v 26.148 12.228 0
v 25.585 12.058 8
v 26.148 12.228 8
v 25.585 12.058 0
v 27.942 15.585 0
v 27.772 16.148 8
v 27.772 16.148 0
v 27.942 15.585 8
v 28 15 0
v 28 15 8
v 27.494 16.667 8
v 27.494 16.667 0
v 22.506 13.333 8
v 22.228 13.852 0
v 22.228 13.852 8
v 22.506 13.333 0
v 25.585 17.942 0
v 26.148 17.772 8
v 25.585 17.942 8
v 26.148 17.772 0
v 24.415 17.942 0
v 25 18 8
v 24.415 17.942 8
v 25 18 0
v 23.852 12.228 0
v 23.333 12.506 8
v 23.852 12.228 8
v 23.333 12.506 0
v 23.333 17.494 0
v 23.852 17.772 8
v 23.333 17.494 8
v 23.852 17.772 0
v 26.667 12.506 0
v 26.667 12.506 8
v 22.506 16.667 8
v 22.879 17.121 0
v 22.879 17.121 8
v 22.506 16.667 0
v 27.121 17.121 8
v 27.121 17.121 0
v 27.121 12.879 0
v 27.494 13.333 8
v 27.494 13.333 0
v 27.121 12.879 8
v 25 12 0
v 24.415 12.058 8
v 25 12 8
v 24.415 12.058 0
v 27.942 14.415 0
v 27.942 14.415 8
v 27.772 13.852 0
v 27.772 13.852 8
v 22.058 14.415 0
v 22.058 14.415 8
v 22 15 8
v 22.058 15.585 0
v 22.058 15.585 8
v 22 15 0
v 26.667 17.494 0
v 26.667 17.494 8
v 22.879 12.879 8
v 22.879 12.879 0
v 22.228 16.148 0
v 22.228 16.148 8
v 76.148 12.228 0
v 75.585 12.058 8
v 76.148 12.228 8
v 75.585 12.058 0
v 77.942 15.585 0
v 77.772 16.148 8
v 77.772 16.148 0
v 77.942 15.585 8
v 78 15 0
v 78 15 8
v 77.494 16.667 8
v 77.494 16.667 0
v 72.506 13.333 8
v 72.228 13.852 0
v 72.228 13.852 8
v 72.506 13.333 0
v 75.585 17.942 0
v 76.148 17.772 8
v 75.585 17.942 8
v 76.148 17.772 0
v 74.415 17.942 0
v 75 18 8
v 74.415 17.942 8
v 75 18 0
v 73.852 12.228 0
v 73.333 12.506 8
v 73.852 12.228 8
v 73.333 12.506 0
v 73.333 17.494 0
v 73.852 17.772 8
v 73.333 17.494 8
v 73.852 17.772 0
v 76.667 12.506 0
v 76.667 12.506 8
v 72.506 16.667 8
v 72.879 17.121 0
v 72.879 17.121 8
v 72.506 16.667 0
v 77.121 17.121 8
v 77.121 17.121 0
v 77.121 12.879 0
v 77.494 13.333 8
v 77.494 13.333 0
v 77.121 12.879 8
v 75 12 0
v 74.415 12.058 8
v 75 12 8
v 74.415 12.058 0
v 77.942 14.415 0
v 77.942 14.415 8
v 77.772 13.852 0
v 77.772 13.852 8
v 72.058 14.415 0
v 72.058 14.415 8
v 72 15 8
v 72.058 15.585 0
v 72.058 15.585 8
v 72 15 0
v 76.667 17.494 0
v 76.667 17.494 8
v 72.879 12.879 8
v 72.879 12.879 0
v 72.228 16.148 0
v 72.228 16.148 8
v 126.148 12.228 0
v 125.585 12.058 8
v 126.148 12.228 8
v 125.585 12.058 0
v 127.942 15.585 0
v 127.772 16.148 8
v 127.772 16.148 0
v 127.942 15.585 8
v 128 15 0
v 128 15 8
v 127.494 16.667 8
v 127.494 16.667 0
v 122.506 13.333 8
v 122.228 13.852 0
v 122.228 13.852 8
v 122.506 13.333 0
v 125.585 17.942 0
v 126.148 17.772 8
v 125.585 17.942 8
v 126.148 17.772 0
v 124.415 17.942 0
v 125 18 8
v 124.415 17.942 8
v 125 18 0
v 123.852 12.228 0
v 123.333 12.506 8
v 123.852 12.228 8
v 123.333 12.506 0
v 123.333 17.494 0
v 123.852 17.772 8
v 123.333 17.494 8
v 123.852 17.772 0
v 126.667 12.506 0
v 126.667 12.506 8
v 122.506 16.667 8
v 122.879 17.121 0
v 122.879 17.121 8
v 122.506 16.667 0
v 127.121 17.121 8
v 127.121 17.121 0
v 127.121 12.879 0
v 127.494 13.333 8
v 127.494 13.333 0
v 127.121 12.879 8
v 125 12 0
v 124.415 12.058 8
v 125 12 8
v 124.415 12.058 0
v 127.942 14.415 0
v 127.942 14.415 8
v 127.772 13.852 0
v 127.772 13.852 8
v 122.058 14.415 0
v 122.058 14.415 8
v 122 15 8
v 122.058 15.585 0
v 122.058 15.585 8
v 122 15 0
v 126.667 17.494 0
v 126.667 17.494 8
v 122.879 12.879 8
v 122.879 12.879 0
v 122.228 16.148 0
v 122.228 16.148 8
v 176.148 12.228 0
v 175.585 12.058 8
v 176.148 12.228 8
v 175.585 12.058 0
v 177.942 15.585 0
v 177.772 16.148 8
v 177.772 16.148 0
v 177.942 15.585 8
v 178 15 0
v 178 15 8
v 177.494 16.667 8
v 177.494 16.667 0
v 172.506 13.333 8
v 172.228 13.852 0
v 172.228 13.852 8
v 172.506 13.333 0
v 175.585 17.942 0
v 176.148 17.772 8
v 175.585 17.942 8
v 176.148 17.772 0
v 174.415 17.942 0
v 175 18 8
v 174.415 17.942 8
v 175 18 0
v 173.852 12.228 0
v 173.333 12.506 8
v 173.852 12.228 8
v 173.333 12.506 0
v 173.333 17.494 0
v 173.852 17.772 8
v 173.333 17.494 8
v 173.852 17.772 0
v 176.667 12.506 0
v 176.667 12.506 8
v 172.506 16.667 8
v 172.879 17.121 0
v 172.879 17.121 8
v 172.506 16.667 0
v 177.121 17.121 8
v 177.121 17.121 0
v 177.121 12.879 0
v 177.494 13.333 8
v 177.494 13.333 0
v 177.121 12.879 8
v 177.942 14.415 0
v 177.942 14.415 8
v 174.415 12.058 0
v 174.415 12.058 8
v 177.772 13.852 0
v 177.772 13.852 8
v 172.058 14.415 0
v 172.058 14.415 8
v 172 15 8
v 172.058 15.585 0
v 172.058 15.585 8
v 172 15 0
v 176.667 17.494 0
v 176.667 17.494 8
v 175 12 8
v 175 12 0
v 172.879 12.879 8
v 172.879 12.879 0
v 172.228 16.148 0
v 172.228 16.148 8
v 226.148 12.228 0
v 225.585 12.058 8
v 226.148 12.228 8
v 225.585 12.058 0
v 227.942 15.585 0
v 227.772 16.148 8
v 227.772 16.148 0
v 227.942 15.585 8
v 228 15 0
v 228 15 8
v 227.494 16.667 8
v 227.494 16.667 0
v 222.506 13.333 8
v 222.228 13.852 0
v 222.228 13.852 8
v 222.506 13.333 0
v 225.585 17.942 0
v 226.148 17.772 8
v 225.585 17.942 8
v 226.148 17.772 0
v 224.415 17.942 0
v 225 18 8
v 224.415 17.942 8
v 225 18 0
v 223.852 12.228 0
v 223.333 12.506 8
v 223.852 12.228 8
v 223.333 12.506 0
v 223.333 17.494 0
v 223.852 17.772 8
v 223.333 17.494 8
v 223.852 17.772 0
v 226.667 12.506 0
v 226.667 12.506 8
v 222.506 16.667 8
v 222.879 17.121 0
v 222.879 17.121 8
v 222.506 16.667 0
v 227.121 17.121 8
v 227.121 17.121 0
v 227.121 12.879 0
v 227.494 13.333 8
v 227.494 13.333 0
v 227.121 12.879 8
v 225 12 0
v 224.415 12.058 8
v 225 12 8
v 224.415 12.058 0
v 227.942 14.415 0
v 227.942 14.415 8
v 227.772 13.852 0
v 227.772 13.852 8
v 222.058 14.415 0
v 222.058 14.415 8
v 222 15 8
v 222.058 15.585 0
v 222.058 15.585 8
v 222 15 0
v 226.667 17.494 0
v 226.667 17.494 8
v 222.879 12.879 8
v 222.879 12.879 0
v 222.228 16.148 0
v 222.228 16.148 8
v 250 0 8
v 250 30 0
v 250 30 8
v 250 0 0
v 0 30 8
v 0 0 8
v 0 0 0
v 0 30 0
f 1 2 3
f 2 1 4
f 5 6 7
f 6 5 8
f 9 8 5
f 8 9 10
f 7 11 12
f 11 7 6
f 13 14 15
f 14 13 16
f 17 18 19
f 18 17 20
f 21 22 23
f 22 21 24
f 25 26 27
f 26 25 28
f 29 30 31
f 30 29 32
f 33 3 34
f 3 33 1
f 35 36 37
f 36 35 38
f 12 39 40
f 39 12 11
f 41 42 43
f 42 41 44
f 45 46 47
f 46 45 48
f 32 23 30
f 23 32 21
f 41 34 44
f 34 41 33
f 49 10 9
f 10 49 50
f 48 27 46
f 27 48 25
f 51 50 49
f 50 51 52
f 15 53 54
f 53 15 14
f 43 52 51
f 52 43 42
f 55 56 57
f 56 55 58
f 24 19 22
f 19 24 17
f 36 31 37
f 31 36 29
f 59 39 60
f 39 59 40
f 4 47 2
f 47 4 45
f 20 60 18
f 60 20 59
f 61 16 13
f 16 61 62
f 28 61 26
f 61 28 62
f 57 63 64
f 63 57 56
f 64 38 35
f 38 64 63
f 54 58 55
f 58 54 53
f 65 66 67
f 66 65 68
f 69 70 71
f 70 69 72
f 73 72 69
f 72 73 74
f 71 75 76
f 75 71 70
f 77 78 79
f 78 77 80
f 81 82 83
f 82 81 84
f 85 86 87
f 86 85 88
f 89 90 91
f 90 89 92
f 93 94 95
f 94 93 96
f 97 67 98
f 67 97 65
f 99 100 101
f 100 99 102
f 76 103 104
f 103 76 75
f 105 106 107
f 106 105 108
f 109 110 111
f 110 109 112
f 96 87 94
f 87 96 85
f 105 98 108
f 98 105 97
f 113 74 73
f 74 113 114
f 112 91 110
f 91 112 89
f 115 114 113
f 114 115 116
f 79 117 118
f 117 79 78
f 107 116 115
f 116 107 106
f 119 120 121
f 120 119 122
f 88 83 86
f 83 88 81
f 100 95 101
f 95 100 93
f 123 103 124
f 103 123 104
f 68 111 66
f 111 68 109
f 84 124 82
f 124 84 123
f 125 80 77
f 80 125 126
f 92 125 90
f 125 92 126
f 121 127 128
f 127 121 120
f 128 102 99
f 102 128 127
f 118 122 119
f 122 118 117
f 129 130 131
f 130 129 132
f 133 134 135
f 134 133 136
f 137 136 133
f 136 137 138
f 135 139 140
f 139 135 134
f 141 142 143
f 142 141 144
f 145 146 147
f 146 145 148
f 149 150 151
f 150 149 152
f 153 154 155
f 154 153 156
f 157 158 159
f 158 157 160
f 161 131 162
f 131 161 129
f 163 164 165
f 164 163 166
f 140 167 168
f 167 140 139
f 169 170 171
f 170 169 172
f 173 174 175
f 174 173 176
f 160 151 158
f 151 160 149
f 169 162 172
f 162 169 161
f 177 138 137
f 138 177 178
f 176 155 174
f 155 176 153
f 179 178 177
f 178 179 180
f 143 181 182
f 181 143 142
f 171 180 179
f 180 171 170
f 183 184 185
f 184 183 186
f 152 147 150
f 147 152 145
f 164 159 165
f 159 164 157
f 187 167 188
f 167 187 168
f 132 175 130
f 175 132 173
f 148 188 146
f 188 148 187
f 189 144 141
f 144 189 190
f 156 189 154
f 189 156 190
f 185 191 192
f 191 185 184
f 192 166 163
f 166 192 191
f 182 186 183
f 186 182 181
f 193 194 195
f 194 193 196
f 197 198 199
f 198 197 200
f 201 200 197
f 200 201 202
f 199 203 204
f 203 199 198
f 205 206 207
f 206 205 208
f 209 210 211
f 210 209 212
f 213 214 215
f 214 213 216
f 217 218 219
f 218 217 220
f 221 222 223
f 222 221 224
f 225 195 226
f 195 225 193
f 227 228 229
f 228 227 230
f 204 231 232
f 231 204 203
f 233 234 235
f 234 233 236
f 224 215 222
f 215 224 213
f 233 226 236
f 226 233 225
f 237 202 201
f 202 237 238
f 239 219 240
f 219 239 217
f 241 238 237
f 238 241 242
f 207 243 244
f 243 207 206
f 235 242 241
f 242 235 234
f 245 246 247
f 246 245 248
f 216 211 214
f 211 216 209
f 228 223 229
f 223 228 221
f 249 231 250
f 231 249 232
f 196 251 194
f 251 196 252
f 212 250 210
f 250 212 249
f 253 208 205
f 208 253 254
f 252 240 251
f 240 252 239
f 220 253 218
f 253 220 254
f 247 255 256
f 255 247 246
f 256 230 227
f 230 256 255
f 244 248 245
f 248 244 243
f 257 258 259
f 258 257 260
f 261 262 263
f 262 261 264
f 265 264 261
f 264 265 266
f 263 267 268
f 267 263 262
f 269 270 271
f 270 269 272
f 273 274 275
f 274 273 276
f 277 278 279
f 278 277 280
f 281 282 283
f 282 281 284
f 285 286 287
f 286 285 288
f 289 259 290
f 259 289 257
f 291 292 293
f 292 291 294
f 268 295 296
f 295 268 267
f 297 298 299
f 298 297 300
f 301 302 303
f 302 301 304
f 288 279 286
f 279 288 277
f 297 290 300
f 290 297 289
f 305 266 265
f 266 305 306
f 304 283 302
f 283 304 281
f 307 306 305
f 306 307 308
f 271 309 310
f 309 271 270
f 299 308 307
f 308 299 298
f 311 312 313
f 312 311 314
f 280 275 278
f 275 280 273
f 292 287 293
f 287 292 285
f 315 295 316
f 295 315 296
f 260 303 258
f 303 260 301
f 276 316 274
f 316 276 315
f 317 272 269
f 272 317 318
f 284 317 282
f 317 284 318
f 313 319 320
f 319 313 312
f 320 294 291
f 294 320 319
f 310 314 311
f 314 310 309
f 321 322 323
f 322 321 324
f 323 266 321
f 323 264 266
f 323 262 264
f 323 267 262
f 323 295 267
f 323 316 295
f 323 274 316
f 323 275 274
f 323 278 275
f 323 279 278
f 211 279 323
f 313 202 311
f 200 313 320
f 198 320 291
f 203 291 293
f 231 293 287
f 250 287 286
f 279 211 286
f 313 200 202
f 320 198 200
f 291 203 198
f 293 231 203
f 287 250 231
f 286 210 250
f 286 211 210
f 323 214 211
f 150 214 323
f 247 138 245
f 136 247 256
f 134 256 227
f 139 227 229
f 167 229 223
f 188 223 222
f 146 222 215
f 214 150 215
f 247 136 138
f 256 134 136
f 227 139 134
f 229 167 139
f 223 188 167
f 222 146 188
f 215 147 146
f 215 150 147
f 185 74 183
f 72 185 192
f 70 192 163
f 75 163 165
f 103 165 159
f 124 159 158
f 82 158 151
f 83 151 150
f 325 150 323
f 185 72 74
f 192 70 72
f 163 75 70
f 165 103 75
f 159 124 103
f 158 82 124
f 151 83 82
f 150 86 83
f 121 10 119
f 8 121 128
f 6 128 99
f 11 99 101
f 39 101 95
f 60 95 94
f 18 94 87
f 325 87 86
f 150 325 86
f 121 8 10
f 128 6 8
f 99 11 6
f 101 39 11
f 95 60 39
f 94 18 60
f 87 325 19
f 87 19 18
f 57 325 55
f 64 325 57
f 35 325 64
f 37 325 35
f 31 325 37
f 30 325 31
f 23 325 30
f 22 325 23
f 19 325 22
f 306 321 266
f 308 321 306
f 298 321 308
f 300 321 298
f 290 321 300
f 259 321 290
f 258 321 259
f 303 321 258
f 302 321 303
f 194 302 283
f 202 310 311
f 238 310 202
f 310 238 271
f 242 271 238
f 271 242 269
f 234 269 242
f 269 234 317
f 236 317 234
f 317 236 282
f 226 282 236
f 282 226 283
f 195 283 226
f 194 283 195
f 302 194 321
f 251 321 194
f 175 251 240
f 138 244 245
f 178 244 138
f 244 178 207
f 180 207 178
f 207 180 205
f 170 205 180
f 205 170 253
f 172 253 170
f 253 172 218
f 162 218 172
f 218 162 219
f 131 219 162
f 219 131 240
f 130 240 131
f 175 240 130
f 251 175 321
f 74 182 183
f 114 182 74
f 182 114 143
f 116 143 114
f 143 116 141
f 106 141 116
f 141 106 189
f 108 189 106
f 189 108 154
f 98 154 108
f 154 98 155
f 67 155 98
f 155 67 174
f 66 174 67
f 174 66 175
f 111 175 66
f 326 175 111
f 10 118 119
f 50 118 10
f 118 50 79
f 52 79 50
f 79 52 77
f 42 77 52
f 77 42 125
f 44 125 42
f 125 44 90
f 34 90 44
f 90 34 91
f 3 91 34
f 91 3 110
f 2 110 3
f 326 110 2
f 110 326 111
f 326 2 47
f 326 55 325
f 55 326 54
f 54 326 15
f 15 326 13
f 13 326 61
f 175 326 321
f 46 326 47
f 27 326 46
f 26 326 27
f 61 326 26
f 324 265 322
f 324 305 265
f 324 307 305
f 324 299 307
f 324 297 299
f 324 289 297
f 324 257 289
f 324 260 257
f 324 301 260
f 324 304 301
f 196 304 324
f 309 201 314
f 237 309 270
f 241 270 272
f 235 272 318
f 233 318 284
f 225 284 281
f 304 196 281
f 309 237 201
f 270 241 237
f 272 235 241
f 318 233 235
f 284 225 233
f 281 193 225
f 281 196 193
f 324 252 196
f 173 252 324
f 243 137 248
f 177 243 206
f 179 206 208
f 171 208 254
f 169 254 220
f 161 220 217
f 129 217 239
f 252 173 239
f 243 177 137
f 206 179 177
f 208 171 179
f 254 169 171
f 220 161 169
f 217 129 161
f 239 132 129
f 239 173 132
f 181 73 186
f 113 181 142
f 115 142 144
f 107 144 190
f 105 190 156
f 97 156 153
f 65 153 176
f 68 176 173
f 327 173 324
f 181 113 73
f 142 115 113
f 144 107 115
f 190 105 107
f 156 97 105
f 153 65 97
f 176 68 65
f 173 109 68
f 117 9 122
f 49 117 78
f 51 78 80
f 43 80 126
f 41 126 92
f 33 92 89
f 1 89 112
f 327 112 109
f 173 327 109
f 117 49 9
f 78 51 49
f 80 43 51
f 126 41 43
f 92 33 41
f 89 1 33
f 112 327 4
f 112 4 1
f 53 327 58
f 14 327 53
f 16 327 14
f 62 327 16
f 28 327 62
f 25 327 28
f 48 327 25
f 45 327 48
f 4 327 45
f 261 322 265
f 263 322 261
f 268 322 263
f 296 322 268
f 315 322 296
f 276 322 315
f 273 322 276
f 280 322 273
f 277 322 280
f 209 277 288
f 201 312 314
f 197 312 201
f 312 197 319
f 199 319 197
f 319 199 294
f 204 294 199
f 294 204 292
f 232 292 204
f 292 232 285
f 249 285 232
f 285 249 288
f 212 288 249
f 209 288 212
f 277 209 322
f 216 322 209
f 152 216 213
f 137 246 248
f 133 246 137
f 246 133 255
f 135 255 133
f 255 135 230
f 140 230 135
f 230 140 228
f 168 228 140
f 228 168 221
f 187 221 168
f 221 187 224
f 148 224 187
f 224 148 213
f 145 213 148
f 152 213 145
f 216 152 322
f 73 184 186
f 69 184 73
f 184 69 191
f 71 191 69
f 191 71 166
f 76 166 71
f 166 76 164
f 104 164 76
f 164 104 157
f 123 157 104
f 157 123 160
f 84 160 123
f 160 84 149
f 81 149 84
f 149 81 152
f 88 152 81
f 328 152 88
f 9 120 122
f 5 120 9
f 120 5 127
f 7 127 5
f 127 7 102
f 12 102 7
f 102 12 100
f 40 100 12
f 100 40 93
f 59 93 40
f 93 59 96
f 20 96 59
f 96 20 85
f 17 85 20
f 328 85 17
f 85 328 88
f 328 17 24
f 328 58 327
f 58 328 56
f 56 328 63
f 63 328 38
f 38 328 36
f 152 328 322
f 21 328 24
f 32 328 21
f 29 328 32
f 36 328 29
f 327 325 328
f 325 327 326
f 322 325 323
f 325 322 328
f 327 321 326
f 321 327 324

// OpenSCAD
$fn = 32;

// ----------------------------------------------------------------------
// Long rail: 200-250 mm mounting rail
// ----------------------------------------------------------------------

// --- parameters (mm) ---
rail_l = 250;             // rail length, X
rail_w = 30;              // rail width, Y
rail_t = 8;               // rail thickness, Z
hole_d = 6;               // mounting hole diameter
hole_start = 25;          // first hole offset from the end
hole_pitch = 50;          // hole pitch
holes = 5;                // number of holes

difference() {
  cube([rail_l, rail_w, rail_t]);
  for (i = [0 : holes - 1])
    translate([hole_start + i * hole_pitch, rail_w / 2, -1])
      cylinder(h = rail_t + 2, d = hole_d);
}
